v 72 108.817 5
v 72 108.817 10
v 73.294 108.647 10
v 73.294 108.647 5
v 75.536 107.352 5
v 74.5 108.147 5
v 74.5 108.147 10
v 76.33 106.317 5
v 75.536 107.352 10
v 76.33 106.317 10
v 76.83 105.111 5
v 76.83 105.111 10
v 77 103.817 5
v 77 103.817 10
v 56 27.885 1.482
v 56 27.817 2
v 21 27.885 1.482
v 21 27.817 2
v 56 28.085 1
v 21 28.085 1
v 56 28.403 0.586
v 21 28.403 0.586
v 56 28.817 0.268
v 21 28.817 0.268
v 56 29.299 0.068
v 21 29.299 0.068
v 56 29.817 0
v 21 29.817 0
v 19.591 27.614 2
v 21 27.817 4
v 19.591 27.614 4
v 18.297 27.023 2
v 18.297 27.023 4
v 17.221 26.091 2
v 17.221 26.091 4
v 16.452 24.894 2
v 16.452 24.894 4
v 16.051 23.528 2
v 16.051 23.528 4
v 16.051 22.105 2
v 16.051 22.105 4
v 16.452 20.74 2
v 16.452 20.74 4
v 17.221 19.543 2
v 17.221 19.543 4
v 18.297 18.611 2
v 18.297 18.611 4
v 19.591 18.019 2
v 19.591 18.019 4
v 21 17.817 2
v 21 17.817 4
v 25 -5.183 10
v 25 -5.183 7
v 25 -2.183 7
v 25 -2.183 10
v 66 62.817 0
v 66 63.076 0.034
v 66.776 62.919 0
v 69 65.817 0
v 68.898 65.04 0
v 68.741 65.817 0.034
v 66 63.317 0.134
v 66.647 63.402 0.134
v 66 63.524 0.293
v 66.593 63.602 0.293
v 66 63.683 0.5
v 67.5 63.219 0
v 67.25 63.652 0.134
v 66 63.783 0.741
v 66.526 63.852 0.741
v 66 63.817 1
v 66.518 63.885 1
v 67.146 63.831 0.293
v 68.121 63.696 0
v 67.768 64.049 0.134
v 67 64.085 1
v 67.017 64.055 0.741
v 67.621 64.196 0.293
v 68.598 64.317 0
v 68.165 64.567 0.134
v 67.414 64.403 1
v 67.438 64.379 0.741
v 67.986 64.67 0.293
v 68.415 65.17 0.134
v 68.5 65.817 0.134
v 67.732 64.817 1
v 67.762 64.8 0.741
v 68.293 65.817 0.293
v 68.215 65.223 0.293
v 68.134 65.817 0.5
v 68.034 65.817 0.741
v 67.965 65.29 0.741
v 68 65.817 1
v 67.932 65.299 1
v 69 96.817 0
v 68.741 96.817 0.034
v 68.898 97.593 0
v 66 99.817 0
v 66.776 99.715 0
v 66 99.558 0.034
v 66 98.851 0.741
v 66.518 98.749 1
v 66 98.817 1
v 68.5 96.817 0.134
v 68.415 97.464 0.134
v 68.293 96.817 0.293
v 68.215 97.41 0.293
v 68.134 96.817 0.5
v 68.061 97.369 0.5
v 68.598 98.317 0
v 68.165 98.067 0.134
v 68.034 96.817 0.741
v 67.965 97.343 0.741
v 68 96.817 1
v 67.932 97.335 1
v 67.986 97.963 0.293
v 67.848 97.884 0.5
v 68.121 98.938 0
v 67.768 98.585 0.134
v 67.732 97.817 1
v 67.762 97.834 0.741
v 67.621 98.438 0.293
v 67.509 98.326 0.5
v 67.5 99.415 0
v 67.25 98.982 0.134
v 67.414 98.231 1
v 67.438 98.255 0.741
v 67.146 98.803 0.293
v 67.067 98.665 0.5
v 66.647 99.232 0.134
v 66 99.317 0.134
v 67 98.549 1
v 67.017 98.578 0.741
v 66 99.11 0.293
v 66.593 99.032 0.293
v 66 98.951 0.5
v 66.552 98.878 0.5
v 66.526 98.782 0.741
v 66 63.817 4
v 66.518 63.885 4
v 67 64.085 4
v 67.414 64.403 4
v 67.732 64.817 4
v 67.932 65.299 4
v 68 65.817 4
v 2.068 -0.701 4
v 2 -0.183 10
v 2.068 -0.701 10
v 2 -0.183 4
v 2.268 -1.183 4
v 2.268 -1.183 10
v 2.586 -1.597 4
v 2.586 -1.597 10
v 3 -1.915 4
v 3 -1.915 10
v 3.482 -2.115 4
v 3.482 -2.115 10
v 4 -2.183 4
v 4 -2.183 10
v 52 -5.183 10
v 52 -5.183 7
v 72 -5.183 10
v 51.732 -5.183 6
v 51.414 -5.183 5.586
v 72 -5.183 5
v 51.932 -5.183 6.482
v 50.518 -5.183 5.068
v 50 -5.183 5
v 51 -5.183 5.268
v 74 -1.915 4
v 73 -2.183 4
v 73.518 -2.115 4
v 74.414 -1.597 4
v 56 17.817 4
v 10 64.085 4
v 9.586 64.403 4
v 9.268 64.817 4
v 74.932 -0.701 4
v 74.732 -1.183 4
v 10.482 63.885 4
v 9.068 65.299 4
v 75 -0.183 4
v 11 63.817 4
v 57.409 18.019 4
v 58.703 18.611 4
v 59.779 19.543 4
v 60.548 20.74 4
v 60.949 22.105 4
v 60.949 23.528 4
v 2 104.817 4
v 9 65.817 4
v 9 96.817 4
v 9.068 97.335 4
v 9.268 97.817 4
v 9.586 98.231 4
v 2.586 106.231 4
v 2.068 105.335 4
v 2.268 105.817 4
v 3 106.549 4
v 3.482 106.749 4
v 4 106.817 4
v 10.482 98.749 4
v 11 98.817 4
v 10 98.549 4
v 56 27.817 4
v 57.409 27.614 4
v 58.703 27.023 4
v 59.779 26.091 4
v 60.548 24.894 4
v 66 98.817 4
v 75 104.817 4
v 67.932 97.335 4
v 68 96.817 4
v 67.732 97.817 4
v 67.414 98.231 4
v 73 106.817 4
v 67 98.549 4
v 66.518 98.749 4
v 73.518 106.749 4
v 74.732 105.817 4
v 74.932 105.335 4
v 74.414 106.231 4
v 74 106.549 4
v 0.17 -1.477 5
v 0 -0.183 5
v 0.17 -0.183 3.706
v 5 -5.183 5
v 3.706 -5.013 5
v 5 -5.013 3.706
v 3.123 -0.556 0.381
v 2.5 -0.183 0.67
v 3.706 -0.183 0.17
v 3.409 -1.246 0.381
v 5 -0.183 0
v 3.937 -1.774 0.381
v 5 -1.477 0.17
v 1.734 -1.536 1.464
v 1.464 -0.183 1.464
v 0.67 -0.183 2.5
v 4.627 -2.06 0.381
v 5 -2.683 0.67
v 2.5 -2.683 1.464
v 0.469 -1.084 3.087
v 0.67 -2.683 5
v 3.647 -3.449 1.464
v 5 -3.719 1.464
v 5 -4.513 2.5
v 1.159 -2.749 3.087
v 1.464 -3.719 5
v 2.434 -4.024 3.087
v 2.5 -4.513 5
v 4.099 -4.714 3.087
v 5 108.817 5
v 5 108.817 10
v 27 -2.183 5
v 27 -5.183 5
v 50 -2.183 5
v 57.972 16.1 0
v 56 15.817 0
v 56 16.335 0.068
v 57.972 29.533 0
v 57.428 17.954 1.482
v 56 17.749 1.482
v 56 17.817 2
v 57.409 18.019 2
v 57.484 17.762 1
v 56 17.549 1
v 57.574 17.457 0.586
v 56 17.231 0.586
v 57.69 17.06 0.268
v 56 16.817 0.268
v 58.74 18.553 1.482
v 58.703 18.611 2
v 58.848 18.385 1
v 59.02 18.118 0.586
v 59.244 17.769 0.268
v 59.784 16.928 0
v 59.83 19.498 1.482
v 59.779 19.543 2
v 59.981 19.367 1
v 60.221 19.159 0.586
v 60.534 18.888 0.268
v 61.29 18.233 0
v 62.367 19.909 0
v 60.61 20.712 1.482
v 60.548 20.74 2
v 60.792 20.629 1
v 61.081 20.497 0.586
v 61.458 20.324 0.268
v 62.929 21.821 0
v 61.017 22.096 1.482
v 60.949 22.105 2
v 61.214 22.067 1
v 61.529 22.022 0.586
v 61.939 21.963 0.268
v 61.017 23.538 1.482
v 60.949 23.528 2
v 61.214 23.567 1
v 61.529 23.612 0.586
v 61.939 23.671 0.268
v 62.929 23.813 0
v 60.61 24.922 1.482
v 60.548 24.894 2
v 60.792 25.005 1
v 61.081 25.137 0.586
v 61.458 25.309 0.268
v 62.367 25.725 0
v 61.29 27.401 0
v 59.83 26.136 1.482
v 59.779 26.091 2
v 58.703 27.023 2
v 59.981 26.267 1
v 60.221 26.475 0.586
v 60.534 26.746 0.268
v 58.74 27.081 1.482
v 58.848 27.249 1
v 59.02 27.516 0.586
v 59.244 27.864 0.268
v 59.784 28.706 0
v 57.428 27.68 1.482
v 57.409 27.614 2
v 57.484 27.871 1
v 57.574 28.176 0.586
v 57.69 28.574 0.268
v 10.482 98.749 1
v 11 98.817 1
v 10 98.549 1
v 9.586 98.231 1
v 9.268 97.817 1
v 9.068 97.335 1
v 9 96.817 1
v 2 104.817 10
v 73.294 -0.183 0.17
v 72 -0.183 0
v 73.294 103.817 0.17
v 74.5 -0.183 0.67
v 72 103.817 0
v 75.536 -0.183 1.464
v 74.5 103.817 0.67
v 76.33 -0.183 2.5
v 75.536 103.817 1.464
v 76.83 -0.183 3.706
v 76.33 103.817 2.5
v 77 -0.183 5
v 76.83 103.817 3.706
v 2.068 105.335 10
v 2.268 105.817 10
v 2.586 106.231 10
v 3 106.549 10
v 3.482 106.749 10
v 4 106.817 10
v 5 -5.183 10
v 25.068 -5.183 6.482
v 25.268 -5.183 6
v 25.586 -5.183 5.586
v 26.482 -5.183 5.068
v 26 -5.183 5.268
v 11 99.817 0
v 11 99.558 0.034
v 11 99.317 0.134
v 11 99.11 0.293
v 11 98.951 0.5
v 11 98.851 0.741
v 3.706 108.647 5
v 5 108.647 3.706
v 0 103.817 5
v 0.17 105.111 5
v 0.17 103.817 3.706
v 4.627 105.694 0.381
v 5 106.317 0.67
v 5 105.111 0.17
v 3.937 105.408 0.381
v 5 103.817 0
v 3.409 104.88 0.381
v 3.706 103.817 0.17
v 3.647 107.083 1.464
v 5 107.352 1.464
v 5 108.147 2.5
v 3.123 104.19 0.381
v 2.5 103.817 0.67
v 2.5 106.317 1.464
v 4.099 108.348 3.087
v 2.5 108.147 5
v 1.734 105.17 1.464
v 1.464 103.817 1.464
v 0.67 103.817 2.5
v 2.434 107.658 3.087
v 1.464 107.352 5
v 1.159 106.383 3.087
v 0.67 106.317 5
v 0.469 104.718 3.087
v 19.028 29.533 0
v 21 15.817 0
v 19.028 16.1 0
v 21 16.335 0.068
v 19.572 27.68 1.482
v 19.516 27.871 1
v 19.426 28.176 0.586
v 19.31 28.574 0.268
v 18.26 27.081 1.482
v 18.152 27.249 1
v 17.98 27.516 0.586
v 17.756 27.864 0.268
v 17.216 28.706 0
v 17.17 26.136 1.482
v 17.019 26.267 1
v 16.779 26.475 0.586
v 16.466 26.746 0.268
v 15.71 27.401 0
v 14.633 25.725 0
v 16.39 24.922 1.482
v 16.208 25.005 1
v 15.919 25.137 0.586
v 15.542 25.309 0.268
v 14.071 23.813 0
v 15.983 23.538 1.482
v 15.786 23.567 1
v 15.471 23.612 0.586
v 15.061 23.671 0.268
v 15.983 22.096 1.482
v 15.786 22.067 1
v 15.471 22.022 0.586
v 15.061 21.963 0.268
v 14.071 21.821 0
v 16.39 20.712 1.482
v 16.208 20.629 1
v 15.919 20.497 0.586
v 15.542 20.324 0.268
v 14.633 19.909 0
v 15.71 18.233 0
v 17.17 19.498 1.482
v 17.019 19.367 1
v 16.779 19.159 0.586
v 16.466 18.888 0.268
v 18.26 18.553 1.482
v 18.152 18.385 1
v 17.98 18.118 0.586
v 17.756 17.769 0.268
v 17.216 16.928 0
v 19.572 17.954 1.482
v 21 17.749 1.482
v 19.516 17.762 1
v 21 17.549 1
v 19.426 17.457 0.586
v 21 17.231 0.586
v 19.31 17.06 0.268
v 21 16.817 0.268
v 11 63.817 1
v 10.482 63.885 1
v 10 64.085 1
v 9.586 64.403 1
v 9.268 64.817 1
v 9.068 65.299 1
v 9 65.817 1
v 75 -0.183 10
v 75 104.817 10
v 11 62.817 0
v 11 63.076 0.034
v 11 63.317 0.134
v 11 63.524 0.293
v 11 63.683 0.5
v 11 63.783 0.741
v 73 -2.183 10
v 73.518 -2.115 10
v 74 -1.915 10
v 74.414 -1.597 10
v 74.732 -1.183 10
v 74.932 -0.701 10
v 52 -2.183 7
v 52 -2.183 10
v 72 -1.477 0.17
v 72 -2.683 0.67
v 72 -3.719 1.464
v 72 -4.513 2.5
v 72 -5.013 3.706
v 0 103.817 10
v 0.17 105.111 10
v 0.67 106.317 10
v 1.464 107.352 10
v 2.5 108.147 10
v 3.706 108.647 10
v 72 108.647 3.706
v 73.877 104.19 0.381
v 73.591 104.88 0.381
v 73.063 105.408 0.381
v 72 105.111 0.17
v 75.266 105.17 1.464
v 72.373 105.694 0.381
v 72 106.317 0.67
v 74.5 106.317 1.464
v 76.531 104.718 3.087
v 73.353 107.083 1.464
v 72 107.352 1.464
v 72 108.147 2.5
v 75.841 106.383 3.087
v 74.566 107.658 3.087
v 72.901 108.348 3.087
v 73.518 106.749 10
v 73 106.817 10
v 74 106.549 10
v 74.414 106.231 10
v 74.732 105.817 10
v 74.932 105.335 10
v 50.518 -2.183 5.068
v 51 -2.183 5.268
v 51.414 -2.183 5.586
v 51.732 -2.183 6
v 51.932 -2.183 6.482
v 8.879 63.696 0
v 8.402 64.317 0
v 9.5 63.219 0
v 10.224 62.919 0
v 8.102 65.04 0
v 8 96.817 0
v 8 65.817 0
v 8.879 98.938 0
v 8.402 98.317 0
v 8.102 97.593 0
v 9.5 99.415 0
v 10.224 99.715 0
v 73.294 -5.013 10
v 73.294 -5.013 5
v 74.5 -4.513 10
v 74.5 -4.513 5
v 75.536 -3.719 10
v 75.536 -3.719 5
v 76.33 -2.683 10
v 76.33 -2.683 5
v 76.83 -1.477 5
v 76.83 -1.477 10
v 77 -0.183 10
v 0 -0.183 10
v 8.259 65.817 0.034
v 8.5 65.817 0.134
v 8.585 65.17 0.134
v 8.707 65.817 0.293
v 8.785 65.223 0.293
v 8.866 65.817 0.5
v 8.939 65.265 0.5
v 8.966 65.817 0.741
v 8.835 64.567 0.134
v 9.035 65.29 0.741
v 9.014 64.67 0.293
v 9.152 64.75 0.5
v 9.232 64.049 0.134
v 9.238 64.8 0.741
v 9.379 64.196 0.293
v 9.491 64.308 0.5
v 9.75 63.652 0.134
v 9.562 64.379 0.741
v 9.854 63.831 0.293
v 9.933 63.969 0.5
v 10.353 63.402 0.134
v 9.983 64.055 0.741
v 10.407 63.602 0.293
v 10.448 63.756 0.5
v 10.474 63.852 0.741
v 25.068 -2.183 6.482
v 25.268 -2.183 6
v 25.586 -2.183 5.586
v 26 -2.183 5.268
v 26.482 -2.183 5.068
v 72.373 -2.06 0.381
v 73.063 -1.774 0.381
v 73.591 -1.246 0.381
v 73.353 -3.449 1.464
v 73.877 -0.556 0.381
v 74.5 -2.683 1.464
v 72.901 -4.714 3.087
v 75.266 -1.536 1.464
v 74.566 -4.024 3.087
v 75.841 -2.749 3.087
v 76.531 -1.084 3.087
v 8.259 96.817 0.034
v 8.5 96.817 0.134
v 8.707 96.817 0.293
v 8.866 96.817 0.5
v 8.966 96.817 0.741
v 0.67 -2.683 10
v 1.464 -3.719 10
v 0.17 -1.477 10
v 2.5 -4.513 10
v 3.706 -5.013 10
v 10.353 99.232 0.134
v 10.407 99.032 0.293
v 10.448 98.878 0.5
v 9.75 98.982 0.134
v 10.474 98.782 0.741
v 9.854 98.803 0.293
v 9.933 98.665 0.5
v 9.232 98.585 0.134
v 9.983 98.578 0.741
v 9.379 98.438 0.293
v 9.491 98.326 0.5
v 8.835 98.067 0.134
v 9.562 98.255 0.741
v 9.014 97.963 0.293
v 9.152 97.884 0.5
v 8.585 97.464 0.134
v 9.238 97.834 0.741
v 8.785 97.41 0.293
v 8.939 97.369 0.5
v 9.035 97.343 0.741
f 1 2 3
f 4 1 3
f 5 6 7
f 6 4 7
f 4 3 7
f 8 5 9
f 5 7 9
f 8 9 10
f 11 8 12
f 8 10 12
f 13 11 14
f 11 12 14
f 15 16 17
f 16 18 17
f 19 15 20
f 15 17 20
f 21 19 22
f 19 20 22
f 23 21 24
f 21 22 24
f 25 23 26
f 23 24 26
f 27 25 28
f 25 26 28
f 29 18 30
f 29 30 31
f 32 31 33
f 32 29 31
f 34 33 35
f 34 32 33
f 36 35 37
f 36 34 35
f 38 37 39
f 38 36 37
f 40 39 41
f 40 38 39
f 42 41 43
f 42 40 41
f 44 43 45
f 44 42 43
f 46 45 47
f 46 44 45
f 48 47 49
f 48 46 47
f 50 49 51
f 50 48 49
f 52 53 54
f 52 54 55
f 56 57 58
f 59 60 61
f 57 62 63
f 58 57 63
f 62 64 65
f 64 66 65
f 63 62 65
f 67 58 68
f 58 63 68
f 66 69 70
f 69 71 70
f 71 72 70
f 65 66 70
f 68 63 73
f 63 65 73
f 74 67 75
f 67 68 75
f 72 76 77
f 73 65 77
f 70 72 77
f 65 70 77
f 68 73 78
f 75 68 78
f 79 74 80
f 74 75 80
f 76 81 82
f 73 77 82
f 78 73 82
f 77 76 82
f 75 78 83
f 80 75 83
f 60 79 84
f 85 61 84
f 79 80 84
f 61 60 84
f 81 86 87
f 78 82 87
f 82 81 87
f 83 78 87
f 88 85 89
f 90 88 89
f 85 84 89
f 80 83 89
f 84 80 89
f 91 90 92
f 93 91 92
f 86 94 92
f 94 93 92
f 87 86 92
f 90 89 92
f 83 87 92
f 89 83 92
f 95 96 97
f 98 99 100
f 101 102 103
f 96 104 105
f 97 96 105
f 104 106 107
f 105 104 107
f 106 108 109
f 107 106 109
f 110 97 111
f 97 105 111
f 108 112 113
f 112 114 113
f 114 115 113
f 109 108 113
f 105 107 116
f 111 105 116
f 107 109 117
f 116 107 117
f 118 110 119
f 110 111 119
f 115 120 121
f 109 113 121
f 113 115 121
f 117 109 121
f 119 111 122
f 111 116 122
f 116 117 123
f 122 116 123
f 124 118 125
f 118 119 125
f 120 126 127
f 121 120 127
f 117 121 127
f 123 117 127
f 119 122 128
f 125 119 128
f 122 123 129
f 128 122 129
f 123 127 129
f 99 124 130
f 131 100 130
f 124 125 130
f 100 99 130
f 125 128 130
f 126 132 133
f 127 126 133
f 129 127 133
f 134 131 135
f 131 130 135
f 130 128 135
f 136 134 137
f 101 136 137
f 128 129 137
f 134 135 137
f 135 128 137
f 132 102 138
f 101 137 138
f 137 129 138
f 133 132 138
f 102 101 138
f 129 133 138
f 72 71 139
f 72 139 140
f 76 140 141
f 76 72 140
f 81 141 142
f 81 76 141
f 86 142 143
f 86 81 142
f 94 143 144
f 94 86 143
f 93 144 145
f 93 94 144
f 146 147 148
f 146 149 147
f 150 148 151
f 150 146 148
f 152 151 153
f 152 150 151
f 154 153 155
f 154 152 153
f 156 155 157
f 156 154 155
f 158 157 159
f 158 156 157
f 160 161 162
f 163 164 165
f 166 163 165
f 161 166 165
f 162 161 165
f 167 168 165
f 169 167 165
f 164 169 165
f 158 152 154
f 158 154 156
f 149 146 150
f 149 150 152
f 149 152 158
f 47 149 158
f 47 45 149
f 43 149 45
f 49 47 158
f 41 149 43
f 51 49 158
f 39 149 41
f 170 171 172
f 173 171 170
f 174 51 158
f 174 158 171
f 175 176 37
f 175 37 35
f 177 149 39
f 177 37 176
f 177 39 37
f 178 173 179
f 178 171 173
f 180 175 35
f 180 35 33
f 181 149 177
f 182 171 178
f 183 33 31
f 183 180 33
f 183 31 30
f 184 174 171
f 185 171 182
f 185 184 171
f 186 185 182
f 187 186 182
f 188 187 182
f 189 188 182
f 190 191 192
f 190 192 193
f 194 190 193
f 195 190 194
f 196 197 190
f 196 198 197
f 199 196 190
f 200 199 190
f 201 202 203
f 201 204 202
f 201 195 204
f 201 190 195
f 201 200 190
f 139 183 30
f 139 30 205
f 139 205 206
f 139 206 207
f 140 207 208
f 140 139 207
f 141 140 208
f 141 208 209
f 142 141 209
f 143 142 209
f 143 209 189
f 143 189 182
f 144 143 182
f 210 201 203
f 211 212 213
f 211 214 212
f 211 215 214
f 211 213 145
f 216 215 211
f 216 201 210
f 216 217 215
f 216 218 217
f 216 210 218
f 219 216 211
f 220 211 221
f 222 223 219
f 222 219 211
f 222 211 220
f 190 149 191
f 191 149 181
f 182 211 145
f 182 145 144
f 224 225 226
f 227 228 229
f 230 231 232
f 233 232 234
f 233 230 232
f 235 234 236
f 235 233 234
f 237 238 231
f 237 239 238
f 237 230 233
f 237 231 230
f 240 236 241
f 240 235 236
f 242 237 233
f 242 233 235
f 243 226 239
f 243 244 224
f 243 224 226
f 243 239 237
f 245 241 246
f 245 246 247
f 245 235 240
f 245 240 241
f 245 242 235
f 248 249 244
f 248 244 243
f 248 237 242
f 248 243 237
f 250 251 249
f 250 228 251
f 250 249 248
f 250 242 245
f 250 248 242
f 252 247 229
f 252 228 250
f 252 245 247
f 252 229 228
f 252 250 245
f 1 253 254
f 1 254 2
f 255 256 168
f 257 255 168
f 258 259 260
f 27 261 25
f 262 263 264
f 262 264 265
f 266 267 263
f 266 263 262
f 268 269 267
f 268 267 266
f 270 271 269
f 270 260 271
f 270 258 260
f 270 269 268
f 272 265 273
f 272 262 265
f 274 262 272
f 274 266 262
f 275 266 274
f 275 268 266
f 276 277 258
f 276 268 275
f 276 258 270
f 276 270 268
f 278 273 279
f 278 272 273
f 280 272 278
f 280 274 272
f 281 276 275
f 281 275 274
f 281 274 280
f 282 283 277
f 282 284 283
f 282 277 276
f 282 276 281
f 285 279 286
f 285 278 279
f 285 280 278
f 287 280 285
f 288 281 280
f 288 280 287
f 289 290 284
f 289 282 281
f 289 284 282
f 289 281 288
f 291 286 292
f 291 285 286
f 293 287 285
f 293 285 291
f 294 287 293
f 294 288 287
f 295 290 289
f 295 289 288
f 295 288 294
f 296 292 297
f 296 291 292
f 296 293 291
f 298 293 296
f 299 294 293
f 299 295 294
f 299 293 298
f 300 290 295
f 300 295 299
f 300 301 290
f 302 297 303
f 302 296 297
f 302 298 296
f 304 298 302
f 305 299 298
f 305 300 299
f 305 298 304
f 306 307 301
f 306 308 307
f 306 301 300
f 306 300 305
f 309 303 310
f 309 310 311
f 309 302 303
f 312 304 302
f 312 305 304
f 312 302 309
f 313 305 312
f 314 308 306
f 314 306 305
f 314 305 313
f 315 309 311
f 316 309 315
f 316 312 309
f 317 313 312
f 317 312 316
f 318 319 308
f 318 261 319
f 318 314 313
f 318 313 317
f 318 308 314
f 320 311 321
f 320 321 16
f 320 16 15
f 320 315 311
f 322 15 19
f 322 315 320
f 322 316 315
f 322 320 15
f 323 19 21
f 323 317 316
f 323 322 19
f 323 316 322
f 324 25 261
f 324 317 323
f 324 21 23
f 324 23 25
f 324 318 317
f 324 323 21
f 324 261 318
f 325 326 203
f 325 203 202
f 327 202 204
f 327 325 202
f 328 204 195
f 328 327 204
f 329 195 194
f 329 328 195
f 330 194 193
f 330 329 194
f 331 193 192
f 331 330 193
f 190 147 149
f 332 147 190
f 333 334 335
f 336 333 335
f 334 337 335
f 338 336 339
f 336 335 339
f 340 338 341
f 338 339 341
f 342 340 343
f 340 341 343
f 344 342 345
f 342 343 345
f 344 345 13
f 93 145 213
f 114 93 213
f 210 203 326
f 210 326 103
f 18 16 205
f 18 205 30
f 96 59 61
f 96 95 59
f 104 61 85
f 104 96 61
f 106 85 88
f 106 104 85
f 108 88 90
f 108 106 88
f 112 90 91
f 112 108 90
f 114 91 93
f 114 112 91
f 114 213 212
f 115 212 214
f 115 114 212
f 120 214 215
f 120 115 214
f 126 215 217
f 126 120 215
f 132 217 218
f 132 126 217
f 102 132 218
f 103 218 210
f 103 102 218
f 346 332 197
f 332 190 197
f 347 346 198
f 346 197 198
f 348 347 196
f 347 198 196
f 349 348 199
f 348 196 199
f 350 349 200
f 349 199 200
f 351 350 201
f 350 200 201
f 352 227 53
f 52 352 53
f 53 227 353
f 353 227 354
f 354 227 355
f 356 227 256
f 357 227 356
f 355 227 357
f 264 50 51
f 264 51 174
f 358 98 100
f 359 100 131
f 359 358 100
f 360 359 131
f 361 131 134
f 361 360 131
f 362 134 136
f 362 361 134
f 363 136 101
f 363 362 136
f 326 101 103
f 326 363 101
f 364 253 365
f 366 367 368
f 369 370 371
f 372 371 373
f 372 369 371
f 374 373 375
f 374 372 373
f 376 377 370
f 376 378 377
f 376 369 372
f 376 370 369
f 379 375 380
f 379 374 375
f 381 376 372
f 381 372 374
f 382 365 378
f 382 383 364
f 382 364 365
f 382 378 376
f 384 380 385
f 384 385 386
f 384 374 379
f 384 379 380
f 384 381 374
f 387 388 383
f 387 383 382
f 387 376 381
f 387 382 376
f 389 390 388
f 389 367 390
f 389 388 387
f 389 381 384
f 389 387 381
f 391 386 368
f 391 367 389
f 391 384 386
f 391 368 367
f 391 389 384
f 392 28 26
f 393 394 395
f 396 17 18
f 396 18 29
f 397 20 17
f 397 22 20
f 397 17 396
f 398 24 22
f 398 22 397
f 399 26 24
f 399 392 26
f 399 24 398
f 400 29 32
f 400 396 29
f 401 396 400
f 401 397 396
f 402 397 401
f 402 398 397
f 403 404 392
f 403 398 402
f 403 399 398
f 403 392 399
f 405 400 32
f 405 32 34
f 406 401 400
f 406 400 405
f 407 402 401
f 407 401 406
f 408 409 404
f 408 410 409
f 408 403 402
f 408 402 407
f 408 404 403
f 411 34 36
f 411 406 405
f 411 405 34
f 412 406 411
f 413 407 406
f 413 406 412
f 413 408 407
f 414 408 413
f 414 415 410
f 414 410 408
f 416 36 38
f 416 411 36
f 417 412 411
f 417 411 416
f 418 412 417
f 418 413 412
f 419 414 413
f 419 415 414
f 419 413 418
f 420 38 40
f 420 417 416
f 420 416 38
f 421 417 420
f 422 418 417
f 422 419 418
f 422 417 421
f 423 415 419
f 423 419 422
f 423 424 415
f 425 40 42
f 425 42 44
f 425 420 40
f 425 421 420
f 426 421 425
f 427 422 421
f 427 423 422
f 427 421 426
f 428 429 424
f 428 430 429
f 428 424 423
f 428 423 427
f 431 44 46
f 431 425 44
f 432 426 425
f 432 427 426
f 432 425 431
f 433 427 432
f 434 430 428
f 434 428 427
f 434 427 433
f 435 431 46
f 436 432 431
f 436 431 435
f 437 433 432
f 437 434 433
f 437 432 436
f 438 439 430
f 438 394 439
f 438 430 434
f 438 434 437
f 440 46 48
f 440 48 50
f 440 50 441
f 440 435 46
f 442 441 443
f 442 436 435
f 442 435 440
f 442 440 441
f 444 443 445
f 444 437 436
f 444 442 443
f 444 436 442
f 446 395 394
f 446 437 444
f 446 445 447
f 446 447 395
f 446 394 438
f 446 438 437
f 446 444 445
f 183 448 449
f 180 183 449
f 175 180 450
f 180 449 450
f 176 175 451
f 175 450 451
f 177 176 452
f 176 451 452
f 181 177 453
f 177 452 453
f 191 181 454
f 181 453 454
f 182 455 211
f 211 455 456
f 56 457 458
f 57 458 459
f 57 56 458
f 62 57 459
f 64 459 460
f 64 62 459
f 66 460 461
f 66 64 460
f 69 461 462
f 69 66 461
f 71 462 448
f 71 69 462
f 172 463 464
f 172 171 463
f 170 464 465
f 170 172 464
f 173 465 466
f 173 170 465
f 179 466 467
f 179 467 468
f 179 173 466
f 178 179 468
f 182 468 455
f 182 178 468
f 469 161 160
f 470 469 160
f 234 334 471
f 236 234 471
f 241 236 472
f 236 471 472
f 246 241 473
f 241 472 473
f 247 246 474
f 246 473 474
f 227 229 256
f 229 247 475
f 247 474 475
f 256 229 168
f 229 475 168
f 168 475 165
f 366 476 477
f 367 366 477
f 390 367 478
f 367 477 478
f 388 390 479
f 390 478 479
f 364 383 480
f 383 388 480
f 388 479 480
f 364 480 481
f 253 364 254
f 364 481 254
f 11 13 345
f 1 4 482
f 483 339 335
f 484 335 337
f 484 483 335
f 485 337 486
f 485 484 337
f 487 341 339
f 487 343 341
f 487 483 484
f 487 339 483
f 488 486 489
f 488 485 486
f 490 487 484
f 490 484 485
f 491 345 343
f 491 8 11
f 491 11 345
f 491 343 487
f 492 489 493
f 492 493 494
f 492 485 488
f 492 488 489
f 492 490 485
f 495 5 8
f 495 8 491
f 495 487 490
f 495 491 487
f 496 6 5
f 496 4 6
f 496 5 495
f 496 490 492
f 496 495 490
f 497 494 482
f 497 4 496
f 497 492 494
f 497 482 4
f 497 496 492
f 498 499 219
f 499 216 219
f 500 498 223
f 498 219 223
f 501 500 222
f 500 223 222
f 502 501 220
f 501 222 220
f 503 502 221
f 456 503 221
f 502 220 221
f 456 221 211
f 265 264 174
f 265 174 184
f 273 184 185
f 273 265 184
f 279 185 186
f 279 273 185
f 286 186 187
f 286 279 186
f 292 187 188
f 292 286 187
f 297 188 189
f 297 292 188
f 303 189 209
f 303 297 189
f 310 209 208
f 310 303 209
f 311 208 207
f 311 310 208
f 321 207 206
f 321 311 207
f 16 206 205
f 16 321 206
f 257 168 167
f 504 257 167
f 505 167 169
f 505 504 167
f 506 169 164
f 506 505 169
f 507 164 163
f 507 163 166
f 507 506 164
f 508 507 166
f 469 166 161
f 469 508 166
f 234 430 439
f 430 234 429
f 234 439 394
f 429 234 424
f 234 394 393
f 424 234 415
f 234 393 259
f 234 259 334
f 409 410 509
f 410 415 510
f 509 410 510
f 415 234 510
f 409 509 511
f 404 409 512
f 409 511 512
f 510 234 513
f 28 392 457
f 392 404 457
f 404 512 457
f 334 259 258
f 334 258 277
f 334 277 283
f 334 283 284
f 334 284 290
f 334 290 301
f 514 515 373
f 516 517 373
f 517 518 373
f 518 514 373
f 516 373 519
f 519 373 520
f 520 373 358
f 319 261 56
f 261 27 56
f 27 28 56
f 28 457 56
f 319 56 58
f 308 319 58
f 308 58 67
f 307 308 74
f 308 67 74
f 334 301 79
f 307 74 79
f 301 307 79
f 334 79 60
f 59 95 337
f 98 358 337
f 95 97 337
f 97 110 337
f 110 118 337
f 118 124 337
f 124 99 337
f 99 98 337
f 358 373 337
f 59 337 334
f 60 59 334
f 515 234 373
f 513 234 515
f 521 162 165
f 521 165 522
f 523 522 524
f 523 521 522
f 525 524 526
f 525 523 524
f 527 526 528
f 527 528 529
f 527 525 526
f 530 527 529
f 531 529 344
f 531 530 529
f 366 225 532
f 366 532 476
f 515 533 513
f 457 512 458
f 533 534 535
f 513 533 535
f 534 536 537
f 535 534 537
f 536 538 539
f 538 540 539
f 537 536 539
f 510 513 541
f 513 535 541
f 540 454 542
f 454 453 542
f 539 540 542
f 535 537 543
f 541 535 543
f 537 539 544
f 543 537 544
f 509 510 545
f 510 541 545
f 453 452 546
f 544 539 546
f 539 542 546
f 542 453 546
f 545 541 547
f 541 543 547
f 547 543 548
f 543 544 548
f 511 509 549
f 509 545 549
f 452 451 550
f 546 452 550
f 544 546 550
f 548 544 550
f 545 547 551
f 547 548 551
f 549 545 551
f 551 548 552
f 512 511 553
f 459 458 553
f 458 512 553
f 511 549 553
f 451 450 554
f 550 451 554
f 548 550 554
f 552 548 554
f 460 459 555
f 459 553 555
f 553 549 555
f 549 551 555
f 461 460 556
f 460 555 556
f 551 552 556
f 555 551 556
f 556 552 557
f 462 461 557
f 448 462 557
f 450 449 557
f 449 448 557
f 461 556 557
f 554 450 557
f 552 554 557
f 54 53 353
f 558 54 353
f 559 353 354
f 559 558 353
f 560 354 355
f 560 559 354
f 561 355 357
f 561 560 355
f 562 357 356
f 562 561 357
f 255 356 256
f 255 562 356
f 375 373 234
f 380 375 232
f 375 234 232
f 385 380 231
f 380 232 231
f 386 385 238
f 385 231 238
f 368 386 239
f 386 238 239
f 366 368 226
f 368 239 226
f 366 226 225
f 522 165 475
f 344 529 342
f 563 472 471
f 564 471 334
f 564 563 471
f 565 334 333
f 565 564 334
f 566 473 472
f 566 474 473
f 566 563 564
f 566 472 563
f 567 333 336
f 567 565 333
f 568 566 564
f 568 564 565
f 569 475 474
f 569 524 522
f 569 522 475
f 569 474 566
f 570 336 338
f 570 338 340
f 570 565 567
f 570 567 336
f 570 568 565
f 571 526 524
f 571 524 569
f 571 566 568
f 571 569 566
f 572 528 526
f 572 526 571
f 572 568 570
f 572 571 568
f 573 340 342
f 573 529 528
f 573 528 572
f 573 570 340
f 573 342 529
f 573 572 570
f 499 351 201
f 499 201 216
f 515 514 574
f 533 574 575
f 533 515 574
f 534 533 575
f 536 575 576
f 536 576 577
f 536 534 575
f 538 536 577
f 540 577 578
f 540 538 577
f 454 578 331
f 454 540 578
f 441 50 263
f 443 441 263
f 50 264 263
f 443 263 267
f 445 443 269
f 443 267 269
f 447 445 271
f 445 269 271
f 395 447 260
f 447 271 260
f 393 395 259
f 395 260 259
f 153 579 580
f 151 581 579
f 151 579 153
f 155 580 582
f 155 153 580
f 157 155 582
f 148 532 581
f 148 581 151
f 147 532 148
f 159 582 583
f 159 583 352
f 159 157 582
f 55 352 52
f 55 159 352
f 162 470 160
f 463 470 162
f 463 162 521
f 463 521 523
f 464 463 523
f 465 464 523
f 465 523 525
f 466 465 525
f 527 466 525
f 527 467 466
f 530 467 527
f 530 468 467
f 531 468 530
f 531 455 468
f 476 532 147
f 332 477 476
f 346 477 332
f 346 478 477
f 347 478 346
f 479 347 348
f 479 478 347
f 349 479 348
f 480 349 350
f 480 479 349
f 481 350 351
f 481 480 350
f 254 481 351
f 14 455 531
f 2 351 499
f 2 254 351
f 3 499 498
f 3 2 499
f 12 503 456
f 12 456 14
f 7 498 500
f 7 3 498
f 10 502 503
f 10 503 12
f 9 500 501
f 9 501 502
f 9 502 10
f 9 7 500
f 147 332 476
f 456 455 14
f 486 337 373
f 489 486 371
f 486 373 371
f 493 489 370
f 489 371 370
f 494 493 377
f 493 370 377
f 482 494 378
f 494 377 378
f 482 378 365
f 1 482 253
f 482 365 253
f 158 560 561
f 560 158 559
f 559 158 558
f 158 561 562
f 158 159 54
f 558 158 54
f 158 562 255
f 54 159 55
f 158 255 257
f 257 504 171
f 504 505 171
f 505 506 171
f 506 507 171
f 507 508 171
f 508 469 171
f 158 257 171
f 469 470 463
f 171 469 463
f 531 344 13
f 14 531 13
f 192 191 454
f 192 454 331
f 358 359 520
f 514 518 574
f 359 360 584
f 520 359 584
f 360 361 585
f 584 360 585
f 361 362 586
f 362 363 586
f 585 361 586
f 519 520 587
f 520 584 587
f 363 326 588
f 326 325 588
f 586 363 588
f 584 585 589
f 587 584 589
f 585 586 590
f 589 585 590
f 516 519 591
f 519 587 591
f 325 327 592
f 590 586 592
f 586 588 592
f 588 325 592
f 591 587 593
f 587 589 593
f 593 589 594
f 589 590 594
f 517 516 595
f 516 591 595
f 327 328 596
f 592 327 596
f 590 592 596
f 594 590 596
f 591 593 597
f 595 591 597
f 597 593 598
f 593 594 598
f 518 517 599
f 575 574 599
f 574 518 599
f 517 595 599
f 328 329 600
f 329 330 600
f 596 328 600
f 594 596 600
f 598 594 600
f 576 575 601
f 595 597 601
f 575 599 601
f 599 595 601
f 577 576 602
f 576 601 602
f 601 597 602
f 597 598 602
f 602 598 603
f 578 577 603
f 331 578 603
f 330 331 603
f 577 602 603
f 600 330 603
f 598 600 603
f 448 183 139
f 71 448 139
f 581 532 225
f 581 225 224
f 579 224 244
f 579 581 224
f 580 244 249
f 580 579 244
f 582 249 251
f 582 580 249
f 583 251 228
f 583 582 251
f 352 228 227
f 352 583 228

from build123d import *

# Parameters (mm, degrees)
SKETCH1_W           = 77
SKETCH1_H           = 114
BOSS_EXTRUDE1_DEPTH = 10
SKETCH2_W           = 73
SKETCH2_H           = 109
CUT_EXTRUDE1_DEPTH  = 6
SKETCH3_W           = 59
SKETCH3_H           = 35
CUT_EXTRUDE2_DEPTH  = 6
FILLET1_R           = 5
FILLET2_R           = 5
FILLET3_R           = 2
FILLET4_R           = 2
SKETCH7_W           = 27
SKETCH7_H           = 5
CUT_EXTRUDE8_DEPTH  = 6
FILLET5_R           = 2
CUT_EXTRUDE9_DEPTH  = 10
FILLET6_R           = 2
FILLET7_R           = 1


with BuildPart() as part:
    # Sketch1 → Boss-Extrude1 (new body)
    with BuildSketch(Plane.XY):
        with Locations((38.5, 51.816921292)):
            Rectangle(SKETCH1_W, SKETCH1_H)
    extrude(amount=BOSS_EXTRUDE1_DEPTH)

    # Sketch2 → Cut-Extrude1 (cut)
    with BuildSketch(Plane.XY.offset(10)):
        with Locations((38.5, 52.316921292)):
            Rectangle(SKETCH2_W, SKETCH2_H)
    extrude(amount=-CUT_EXTRUDE1_DEPTH, mode=Mode.SUBTRACT)

    # Sketch3 → Cut-Extrude2 (cut)
    with BuildSketch(Plane.XY.offset(4)):
        with Locations((38.5, 81.316921292)):
            Rectangle(SKETCH3_W, SKETCH3_H)
    extrude(amount=-CUT_EXTRUDE2_DEPTH, mode=Mode.SUBTRACT)

    # Fillet1
    fillet1_edges = [part.edges().sort_by_distance(p)[0] for p in [
        (0, 108.816921292, 5),
        (77, 108.816921292, 5),
        (77, -5.183078708, 5),
        (0, -5.183078708, 5),
    ]]
    fillet(fillet1_edges, radius=FILLET1_R)

    # Fillet2
    fillet2_edges = [part.edges().sort_by_distance(p)[0] for p in [
        (38.5, -5.183078708, 0),
        (0, 51.816921292, 0),
        (38.5, 108.816921292, 0),
        (77, 51.816921292, 0),
        (75.535533906, 107.352455198, 0),
        (1.464466094, 107.352455198, 0),
        (75.535533906, -3.718612614, 0),
        (1.464466094, -3.718612614, 0),
    ]]
    fillet(fillet2_edges, radius=FILLET2_R)

    # Fillet3
    fillet3_edges = [part.edges().sort_by_distance(p)[0] for p in [
        (9, 63.816921292, 2),
        (9, 98.816921292, 2),
        (68, 98.816921292, 2),
        (68, 63.816921292, 2),
    ]]
    fillet(fillet3_edges, radius=FILLET3_R)

    # Fillet4
    fillet4_edges = [part.edges().sort_by_distance(p)[0] for p in [
        (2, -2.183078708, 7),
        (2, 106.816921292, 7),
        (75, 106.816921292, 7),
        (75, -2.183078708, 7),
    ]]
    fillet(fillet4_edges, radius=FILLET4_R)

    # Sketch7 → Cut-Extrude8 (cut)
    with BuildSketch(Plane.XZ.offset(5.183078708)):
        with Locations((38.5, 7.5)):
            Rectangle(SKETCH7_W, SKETCH7_H)
    extrude(amount=-CUT_EXTRUDE8_DEPTH, mode=Mode.SUBTRACT)

    # Fillet5
    fillet5_edges = [part.edges().sort_by_distance(p)[0] for p in [
        (52, -3.683078708, 5),
        (25, -3.683078708, 5),
    ]]
    fillet(fillet5_edges, radius=FILLET5_R)

    # Sketch8 → Cut-Extrude9 (cut)
    with BuildSketch(Plane(origin=(0, 0, 0), x_dir=(-1, 0, 0), z_dir=(0, 0, -1))):
        with BuildLine():
            Line((-56, 27.816921292), (-21, 27.816921292))
            ThreePointArc((-21, 27.816921292), (-16, 22.816921292), (-21, 17.816921292))
            Line((-21, 17.816921292), (-56, 17.816921292))
            ThreePointArc((-56, 17.816921292), (-61, 22.816921292), (-56, 27.816921292))
        make_face()
    extrude(amount=-CUT_EXTRUDE9_DEPTH, mode=Mode.SUBTRACT)

    # Fillet6
    fillet6_edges = [part.edges().sort_by_distance(p)[0] for p in [
        (61, 22.816921292, 0),
        (38.5, 17.816921292, 0),
        (16, 22.816921292, 0),
        (38.5, 27.816921292, 0),
    ]]
    fillet(fillet6_edges, radius=FILLET6_R)

    # Fillet7
    fillet7_edges = [part.edges().sort_by_distance(p)[0] for p in [
        (68, 81.316921292, 0),
        (38.5, 63.816921292, 0),
        (9, 81.316921292, 0),
        (38.5, 98.816921292, 0),
        (67.414213562, 64.402707729, 0),
        (9.585786438, 64.402707729, 0),
        (9.585786438, 98.231134854, 0),
        (67.414213562, 98.231134854, 0),
    ]]
    fillet(fillet7_edges, radius=FILLET7_R)


solid = part.part
